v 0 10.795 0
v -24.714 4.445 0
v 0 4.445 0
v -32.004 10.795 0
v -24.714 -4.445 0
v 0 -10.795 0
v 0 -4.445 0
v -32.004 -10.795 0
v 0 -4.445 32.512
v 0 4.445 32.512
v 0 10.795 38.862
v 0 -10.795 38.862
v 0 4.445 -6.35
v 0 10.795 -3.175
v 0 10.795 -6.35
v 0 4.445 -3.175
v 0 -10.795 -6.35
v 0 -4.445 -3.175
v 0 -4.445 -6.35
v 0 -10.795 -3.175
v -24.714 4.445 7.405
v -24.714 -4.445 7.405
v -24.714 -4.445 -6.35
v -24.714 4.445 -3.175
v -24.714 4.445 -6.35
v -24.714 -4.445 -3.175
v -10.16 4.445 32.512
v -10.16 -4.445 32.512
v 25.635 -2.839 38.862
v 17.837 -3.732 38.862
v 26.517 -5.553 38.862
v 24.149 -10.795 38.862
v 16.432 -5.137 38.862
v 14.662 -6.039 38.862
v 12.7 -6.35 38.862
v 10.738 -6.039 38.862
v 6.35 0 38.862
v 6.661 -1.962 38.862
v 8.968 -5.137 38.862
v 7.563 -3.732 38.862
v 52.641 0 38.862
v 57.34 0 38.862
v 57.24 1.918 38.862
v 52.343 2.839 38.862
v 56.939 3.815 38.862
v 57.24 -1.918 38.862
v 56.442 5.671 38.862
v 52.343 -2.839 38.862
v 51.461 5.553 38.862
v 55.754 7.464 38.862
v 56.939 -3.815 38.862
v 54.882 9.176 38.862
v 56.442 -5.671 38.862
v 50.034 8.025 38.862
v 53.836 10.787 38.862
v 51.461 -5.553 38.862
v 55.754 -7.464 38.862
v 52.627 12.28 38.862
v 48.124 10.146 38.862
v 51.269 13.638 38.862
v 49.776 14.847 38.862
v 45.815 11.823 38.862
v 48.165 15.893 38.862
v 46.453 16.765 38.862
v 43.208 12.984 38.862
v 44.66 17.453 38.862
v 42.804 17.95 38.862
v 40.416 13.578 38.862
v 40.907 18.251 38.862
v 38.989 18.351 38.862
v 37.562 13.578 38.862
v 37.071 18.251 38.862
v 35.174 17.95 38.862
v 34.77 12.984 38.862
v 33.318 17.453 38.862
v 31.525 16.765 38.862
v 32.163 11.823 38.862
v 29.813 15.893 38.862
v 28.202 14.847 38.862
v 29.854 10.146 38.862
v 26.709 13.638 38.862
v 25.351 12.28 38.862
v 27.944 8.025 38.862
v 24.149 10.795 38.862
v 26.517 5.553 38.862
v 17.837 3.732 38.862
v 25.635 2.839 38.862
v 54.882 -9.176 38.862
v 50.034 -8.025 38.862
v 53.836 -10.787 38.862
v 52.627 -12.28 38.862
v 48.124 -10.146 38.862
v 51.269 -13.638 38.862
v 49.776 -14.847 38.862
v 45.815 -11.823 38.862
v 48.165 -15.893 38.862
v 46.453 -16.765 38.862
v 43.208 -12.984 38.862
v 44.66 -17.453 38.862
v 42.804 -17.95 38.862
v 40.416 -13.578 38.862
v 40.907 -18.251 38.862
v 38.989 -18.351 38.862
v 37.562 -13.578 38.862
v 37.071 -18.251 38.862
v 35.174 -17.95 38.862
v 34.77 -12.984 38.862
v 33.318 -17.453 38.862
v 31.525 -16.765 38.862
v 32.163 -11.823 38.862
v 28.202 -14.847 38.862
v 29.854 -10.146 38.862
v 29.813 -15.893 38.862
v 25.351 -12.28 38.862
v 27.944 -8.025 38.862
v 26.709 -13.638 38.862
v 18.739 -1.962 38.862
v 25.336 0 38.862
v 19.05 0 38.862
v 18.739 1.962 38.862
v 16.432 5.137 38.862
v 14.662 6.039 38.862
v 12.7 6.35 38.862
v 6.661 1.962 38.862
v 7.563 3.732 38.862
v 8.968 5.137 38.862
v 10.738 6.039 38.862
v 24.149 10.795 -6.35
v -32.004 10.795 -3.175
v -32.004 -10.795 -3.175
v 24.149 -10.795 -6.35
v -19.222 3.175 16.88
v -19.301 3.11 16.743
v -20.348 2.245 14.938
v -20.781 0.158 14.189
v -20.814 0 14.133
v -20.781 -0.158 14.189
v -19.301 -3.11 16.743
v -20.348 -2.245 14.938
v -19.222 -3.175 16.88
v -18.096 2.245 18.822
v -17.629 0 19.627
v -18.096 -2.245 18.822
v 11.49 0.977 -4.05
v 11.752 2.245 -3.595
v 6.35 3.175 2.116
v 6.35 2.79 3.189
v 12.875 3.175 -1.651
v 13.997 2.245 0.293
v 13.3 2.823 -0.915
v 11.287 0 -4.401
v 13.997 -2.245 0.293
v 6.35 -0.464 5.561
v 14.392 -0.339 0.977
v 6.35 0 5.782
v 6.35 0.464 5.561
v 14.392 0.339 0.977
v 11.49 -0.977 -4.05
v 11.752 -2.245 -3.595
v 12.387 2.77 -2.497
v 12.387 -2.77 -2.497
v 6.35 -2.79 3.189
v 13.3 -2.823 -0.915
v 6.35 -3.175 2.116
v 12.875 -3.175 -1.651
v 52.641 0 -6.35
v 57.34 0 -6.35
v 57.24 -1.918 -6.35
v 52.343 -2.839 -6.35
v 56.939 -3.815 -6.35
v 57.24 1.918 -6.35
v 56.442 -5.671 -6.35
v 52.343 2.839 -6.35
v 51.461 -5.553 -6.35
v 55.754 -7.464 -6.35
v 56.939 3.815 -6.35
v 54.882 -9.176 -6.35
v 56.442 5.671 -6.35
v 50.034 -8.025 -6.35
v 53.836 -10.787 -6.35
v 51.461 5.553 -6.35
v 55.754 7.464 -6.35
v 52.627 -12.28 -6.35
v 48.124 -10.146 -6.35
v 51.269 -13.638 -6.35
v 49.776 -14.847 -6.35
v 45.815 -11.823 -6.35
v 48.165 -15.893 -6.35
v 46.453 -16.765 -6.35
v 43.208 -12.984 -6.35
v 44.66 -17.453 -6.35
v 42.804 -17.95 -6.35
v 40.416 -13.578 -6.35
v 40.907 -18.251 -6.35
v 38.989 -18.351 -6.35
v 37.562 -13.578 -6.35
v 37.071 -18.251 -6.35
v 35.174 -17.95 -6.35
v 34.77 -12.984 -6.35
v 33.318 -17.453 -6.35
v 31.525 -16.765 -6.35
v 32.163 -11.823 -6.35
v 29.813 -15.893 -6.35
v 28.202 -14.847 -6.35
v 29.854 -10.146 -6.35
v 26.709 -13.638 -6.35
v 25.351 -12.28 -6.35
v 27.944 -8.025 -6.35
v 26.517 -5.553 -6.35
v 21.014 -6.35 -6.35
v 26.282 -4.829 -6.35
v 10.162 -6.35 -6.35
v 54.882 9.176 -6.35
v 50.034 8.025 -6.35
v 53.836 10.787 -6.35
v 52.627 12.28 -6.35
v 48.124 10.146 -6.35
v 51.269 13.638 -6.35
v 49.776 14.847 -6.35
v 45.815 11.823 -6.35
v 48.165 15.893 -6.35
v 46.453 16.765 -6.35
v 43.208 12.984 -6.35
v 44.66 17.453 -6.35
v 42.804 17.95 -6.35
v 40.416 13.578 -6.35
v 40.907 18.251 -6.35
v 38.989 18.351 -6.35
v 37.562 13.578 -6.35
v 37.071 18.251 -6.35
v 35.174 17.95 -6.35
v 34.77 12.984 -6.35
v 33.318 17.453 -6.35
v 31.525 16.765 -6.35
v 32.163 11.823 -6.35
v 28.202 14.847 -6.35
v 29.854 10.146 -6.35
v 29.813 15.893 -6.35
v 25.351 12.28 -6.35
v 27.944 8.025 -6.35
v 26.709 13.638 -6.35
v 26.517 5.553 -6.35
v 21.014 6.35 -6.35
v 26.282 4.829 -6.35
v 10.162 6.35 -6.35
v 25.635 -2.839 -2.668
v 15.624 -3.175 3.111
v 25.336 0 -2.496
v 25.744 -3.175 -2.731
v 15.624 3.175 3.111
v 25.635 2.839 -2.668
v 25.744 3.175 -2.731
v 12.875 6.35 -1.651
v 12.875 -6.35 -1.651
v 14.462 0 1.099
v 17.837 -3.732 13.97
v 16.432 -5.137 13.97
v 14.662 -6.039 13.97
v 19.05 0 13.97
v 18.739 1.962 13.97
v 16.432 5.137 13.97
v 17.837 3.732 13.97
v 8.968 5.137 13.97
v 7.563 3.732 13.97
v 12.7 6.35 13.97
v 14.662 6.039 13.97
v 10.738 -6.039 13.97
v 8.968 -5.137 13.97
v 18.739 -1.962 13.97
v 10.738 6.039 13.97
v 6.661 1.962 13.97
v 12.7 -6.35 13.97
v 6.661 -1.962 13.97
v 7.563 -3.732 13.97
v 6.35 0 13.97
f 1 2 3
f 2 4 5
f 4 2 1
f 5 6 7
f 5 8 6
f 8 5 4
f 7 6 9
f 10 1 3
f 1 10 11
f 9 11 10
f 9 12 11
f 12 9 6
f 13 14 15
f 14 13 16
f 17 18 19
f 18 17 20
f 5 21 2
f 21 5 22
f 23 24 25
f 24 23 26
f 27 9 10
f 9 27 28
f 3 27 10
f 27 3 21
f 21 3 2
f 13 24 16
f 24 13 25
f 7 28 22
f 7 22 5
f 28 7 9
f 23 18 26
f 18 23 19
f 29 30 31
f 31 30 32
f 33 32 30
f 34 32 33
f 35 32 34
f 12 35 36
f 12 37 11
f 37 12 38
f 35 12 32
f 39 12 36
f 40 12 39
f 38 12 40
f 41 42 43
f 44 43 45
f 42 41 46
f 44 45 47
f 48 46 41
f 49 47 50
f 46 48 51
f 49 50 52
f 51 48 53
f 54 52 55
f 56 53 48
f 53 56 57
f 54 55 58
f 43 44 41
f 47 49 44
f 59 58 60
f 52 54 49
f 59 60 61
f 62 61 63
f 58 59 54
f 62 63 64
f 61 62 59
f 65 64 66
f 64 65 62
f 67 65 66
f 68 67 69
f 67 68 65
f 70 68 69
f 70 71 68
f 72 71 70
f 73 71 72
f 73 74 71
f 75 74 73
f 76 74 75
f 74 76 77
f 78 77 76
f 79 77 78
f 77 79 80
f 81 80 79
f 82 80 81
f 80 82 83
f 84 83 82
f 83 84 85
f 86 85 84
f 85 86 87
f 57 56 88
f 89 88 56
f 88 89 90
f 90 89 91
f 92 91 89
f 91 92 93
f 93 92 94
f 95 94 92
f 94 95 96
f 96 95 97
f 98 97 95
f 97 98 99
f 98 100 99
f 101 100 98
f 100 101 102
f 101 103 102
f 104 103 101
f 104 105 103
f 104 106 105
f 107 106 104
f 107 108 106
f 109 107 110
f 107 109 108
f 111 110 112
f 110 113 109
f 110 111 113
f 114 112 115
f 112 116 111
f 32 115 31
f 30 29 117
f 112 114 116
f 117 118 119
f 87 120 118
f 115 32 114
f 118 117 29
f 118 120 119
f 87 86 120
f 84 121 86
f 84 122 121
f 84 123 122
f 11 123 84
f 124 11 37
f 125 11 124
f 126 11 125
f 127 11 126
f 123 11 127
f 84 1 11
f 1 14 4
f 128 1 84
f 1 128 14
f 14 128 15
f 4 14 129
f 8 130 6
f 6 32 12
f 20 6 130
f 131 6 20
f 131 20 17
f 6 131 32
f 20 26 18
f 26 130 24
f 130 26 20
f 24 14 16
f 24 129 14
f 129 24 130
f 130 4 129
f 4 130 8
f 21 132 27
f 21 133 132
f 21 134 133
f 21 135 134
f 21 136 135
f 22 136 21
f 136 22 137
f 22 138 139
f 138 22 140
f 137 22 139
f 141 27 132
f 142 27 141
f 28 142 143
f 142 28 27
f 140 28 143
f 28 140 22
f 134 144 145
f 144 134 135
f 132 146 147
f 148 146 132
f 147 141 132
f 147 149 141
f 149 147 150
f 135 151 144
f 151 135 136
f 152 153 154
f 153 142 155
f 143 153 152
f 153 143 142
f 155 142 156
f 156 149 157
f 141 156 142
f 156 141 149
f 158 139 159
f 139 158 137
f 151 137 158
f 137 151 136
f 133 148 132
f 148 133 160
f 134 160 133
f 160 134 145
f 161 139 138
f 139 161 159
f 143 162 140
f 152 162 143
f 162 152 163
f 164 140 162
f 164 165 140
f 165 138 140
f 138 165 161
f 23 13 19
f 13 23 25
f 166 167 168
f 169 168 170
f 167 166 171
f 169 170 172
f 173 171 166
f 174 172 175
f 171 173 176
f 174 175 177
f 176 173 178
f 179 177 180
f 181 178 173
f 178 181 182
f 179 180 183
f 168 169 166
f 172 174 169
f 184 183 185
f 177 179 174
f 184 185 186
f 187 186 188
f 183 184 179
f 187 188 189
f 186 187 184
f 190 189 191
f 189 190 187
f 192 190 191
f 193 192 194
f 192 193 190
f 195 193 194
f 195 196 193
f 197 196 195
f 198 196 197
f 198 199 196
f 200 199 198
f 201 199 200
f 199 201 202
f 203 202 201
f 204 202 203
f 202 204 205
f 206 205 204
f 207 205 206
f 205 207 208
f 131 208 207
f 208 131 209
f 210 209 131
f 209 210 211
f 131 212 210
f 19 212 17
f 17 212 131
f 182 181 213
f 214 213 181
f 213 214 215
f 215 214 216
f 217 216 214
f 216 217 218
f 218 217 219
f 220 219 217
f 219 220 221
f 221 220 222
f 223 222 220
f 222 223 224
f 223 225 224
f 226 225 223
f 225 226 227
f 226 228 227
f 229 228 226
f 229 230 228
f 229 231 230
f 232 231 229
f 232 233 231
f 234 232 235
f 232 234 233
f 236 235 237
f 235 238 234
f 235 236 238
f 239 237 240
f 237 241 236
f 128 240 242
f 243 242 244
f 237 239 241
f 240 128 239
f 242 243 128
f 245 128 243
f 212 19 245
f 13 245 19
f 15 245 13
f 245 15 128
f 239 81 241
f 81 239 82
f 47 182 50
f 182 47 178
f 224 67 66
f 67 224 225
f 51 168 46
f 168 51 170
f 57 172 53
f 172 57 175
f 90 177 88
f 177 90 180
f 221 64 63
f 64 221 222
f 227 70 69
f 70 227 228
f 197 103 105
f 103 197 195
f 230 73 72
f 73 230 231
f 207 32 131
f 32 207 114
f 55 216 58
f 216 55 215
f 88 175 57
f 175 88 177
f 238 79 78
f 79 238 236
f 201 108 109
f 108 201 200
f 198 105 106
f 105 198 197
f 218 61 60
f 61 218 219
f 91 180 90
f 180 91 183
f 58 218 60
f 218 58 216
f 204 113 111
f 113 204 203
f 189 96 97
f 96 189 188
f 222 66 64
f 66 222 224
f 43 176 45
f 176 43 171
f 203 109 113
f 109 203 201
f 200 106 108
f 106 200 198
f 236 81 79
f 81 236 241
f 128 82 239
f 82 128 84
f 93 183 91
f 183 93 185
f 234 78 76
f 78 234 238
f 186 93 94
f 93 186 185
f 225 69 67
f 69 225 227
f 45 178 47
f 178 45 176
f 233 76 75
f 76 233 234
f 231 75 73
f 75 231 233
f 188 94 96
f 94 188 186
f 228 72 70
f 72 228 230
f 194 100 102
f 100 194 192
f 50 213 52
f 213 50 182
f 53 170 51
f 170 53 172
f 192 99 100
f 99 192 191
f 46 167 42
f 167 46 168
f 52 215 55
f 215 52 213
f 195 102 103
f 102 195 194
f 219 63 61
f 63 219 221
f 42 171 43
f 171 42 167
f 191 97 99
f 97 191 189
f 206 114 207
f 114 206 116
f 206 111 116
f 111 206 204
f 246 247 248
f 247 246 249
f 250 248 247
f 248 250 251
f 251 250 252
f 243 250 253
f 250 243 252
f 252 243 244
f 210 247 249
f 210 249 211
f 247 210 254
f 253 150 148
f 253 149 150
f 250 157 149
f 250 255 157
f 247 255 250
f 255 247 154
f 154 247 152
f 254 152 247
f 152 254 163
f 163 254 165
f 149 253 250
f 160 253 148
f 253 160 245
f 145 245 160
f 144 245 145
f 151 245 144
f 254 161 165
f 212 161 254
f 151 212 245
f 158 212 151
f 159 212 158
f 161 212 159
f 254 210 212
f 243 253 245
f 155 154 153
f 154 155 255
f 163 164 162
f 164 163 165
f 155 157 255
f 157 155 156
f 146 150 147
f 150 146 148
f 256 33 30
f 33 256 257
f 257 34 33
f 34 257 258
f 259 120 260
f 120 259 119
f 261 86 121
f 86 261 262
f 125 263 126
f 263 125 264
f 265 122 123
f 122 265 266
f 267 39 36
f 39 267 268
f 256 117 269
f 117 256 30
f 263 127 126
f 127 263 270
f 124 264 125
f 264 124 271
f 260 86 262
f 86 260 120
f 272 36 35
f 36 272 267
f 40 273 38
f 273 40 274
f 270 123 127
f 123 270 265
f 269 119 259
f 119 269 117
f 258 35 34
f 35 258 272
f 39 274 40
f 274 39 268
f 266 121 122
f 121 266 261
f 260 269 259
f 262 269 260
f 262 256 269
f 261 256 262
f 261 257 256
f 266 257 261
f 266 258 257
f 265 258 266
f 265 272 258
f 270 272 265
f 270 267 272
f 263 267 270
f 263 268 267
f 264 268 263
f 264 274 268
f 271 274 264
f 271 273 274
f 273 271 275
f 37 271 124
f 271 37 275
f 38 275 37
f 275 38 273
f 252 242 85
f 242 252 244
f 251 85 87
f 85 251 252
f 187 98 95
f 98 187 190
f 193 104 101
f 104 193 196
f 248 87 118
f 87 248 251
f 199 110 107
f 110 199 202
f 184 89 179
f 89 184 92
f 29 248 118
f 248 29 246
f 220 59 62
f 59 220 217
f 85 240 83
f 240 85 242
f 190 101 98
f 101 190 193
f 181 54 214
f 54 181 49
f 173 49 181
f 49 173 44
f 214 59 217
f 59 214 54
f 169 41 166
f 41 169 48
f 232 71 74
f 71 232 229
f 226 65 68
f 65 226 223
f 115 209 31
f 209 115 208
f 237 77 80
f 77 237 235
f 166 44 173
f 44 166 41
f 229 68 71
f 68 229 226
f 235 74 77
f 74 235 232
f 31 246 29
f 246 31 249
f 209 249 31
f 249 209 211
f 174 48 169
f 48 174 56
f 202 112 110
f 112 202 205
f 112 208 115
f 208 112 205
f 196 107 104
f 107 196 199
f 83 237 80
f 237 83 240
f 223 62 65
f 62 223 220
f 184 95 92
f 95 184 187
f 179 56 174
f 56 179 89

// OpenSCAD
// file: ../Vitamins/Rod.scad
RodDiameter       = 1;
RodRadius         = 2;
RodClearanceSnug  = 3;
RodClearanceLoose = 4;
RodFn             = 5;

function RodClearanceSnug()  = RodClearanceSnug;
function RodClearanceLoose() = RodClearanceLoose;

RodOneEighthInch = [
  [RodDiameter, 1/8],
  [RodRadius, 1/8/2],
  [RodClearanceSnug, 0.02],
  [RodClearanceLoose, 0.03],
  [RodFn, 8]
];
function Spec_RodOneEighthInch() = RodOneEighthInch;

RodOneQuarterInch = [
  [RodDiameter,       1/4],
  [RodRadius,         1/4/2],
  [RodClearanceSnug,  0.027],
  [RodClearanceLoose, 0.035],
  [RodFn,             8]
];
function Spec_RodOneQuarterInch() = RodOneQuarterInch;

RodFiveSixteenthInch = [
  [RodDiameter,       5/16],
  [RodRadius,         5/16/2],
  [RodClearanceSnug,  0.025],
  [RodClearanceLoose, 0.025],
  [RodFn,             10]
];
function Spec_RodFiveSixteenthInch() = RodFiveSixteenthInch;

RodThreeQuarterInchTubing = [
  [RodDiameter,       0.758],
  [RodRadius,         0.758/2],
  [RodClearanceSnug,  0.023],
  [RodClearanceLoose, 0.029],
  [RodFn,             30]
];
function Spec_RodThreeQuarterInchTubing() = RodThreeQuarterInchTubing;

/**
 * Lookup the diameter of a rod.
 * @param rod The rod to lookup.
 * @param clearance The RodClearance to use.
 */
function RodDiameter(rod=undef, clearance=undef)
           = lookup(RodDiameter, rod)
          + (clearance != undef ? lookup(clearance, rod) : 0);

/**
 * Lookup the radius of a rod.
 * @param rod The rod to lookup.
 * @param clearance The RodClearance to use.
 */
function RodRadius(rod, clearance=undef) = RodDiameter(rod, clearance)/2;

/**
 * Lookup the $fn value for a rod, optionally overriding it
 * @param rod The rod to lookup.
 * @param $fn Override the RodFn. If defined, this will be the result. (convenience arg)
 **/
function RodFn(rod, $fn=undef) = ($fn == undef) ? lookup(RodFn, rod) : $fn;

/**
 * A 2D rod (circle).
 * @param rod The rod to render.
 * @param clearance The RodClearance to use.
 * @param $fn Override the RodFn value of the rod.
 */
module Rod2d(rod=RodOneQuarterInch, clearance=undef, $fn=undef) {
  circle(r=RodRadius(rod, clearance),
         $fn=RodFn(rod, $fn));
}


module Rod(rod=RodOneQuarterInch, length=1, clearance=undef, center=false, $fn=undef) {
  render(convexity=1)
  linear_extrude(height=length, center=center)
  Rod2d(rod, clearance, $fn=$fn);
}

// 1/8" Rod
1_8_rod_d                = 1/8;
1_8_rod_r                = 1_8_rod_d/2;
1_8_rod_clearance        = 0.02;
1_8_rod_clearance_loose  = 0.03;

// 1/4" Rod
1_4_rod_d                = 1/4;
1_4_rod_r                = 1_4_rod_d/2;
1_4_rod_clearance        = 0.01;
1_4_rod_clearance_loose  = 0.015;
1_4_rod_collar_d         = 1/22;
1_4_rod_collar_width     = 0.27;
1_4_rod_collar_clearance = 0.0; // TODO

// 5/16" Rod
5_16_rod_d                = 5/16;
5_16_rod_r                = 5_16_rod_d/2;
5_16_rod_clearance        = 0.02; // TODO
5_16_rod_clearance_loose  = 0.02;

module rod(diameter=1, length=1, clearance=0, clearance_loose=0, loose=false, cutter=false, center=false, $fn=20) {
  clearance = loose ? clearance_loose : clearance;

  if (cutter) {
    cylinder(r=(diameter/2) + (loose ? clearance_loose : clearance), h=length, center=center);
  } else {
    cylinder(r=diameter/2, h=length, center=center);
  }
}

module 1_8_rod(length=1, loose=false, cutter=false, center=false) {
  rod(diameter=1_8_rod_d,
      clearance=1_8_rod_clearance,
      clearance_loose=1_8_rod_clearance_loose,
      length=length,
      cutter=cutter,
      center=center);
}

module 1_4_rod(length=1, loose=false, cutter=false, center=false) {
  rod(diameter=1_4_rod_d,
      clearance=1_4_rod_clearance,
      clearance_loose=1_4_rod_clearance_loose,
      loose=loose,
      length=length,
      cutter=cutter,
      center=center);
}

module 1_4_rod_collar(cutter=false) {
  rod(diameter=1_4_rod_collar_d,
      clearance=1_4_rod_collar_clearance,
      cutter=cutter,
      length=1_4_rod_collar_width);
}

module 5_16_rod(length=1, loose=false, cutter=false, center=false) {
  rod(diameter=5_16_rod_d,
      clearance=5_16_rod_clearance,
      clearance_loose=5_16_rod_clearance_loose,
      length=length,
      cutter=cutter,
      center=center);
}
// file: ../Vitamins/Angle Stock.scad
AngleStockWidth                   = 1;
AngleStockThickness               = 2;
AngleStockTrough                  = 3; // Thickness across the "elbow" of the angle
AngleStockWidthClearanceSnug      = 4;
AngleStockWidthClearanceLoose     = 5;
AngleStockThicknessClearanceSnug  = 6;
AngleStockThicknessClearanceLoose = 7;
AngleStockHeight                  = 8;

// .747
// .744
// .745
//.740


//.749
//.75
AngleStockThreeQuartersByOneEighthInch = [
  [AngleStockWidth,                   0.771],
  [AngleStockThickness,               0.13],
  [AngleStockTrough,                  0.235],
  [AngleStockWidthClearanceSnug,      0.008],
  [AngleStockWidthClearanceLoose,     0.015],
  [AngleStockThicknessClearanceSnug,  0.007],
  [AngleStockThicknessClearanceLoose, 0.008],
  [AngleStockHeight,                  0.574]
];

3_4_angle_stock_width                     = 3/4;
3_4_angle_stock_thickness                 = 0.13;
3_4_angle_stock_trough                    = 0.235;
3_4_angle_stock_height                    = 0.574;
3_4_angle_stock_width_clearance           = 0.008;
3_4_angle_stock_width_clearance_loose     = 0.008;
3_4_angle_stock_thickness_clearance       = 0.005;
3_4_angle_stock_thickness_clearance_loose = 0.007;

// trough is a percentage: 0.0-1.0
module AngleStock(stock=AngleStockThreeQuartersByOneEighthInch, trough=.5, thicknessClearance=AngleStockThicknessClearanceLoose, widthClearance=AngleStockWidthClearanceLoose, length=1) {

  // A percentage of the inner-side length (width - thickness)
  clearThicknessOffset = thicknessClearance != undef ? lookup(thicknessClearance, stock) : 0;
  clearWidthOffset     = widthClearance     != undef ? lookup(widthClearance, stock)     : 0;
  troughOffset         = (trough * (lookup(AngleStockWidth, stock) - lookup(AngleStockThickness, stock))) + lookup(AngleStockThickness, stock);

  linear_extrude(height=length)
  polygon(points=[[0,0],
                  [lookup(AngleStockWidth, stock)+clearWidthOffset,0],                                                         // X-POS Outer Corner
                  [lookup(AngleStockWidth, stock)+clearWidthOffset,lookup(AngleStockThickness, stock)+clearThicknessOffset],   // X-POS Inner Corner
                  [troughOffset,lookup(AngleStockThickness, stock)+clearThicknessOffset],                                      // X-POS Trough
                  [lookup(AngleStockThickness, stock)+clearThicknessOffset,troughOffset],                                      // Y-POS Trough
                  [lookup(AngleStockThickness, stock)+clearThicknessOffset,lookup(AngleStockWidth, stock)+clearWidthOffset],   // Y-POS Inner Corner
                  [0,lookup(AngleStockWidth, stock)+clearWidthOffset],                                                         // Y-POS Outer Corner
          ],
          paths=[[0,1,2,3,4,5,6]]);
}


//#AngleStock();

module 3_4_angle_stock(length=1, cutter=false, loose=false) {
  width_clearance     = loose ? 3_4_angle_stock_width_clearance_loose     : 3_4_angle_stock_width_clearance;
  thickness_clearance = loose ? 3_4_angle_stock_thickness_clearance_loose : 3_4_angle_stock_thickness_clearance;

  union() {
    if (cutter) {
      translate([-width_clearance,-thickness_clearance,0])
      cube([3_4_angle_stock_width     + width_clearance*2,
            3_4_angle_stock_thickness + thickness_clearance*2,
            length]);

      translate([-width_clearance,-thickness_clearance,0])
      cube([3_4_angle_stock_thickness + thickness_clearance*2,
            3_4_angle_stock_width     + width_clearance*2,
            length]);

      translate([3_4_angle_stock_thickness/2, 3_4_angle_stock_thickness/2, 0])
      difference() {
        cube([3_4_angle_stock_trough + thickness_clearance/2,
              3_4_angle_stock_trough + thickness_clearance/2,
              length]);

        translate([3_4_angle_stock_trough + thickness_clearance/2,
                   thickness_clearance/2,
                   -0.1])
        rotate([0,0,45])
        cube([3_4_angle_stock_trough*sqrt(2),
              3_4_angle_stock_trough*sqrt(2),
              length + 0.2]);
      }

    } else {
      cube([3_4_angle_stock_width,3_4_angle_stock_thickness,length]);
      cube([3_4_angle_stock_thickness,3_4_angle_stock_width,length]);

      translate([3_4_angle_stock_thickness, 3_4_angle_stock_thickness, 0])
      difference() {
        cube([3_4_angle_stock_trough, 3_4_angle_stock_trough,length]);

        translate([3_4_angle_stock_trough,0,-0.1])
        rotate([0,0,45])
        cube([3_4_angle_stock_trough*sqrt(2), 3_4_angle_stock_trough*sqrt(2),length + 0.2]);
      }
    }
  };
}
// file: ../Math/Triangles.scad
// Pythagorean Theorem
function pyth_A_B(a,b) = sqrt(pow(a, 2) + pow(b, 2));
function pyth_A_C(a,c) = sqrt(pow(c, 2) - pow(a, 2));
function pyth_B_C(b,c) = sqrt(pow(c, 2) - pow(b, 2));

// Heron's Formula for Triangle Area
function heron_triangle_area(a,b,c) = sqrt(
    ((a+b+c)/2)
    * (((a+b+c)/2) - a)
    * (((a+b+c)/2) - b)
    * (((a+b+c)/2) - c)
  );

function heron_triangle_height(a,b,c) = 2 * heron_triangle_area(a,b,c) / c;
// file: ../Components.scad
include <Math/Triangles.scad>;
include <Vitamins/Angle Stock.scad>;
include <Vitamins/Pipe.scad>;
include <Vitamins/Rod.scad>;

//
// Component Dimensions
//
$fn=60;

// Fascist Settings
overall_length = 26.5;
barrel_length = 18.5;

// Configurable: Wall Thickness
tee_overlap             = 3/16;

rope_od                 = 6/32;

// Configurable: Cylinder
cylinder_spindle_diameter    = 1/8;
cylinder_spindle_wall        = 5/16;
revolver_cylinder_wall       = PipeWall(PipeOneInch);
revolver_cylinder_outer_wall = 3/64;
spindle_overlap              = revolver_cylinder_wall;
revolver_zigzag_pin_diameter = 4/32;
revolver_zigzag_depth        = 3/16;
revolver_shots               = 6;
zigzag_clearance             = 1/64;
chamber_length               = 3;
chamber_seal_overlap         = 1/4;
spindle_collar_diameter      = 0.505;
spindle_collar_height        = 0.27;
actuator_cylinder_clearance  = 0.1;

// Configurable: Vitamin Selection
railRod        = RodFiveSixteenthInch;
breechBushing  = BushingThreeQuarterInch;
barrelPipe     = TubingOnePointOneTwoFive;
stockPipe      = PipeThreeQuarterInch;
receiverTee    = TeeThreeQuarterInch;
gasSealingPipe = PipeOneInch;

// Configurable: Common Settings
bottomRailAngle = 50;

// Configurable: Forend
forend_length = 2;
forend_wall_thickness = 3/16;

// AR15 grip info
grip_width                 = 0.85;
grip_height                = 1.27;


// Calculated: Revolver Cylinder
zigzag_width = revolver_zigzag_pin_diameter + zigzag_clearance*2;
revolver_cylinder_radius = (PipeOuterDiameter(PipeThreeQuarterInch)*1.5)+revolver_cylinder_wall + revolver_cylinder_outer_wall + revolver_zigzag_depth;
revolver_cylinder_od   = revolver_cylinder_radius*2;
cylinder_circumference = 3.14 * pow(revolver_cylinder_od/2, 2);
revolver_center_offset = PipeOuterDiameter(PipeThreeQuarterInch) + revolver_cylinder_wall;
rotation_angle = 360/revolver_shots;
rotation_arc = cylinder_circumference/revolver_shots;
zigzag_height = rotation_arc/2 + revolver_zigzag_pin_diameter*2;
revolver_cylinder_height = zigzag_height + revolver_zigzag_pin_diameter*2.5;
chamber_protrusion = (chamber_length - revolver_cylinder_height)/2;

top_slot_height = revolver_zigzag_pin_diameter*2;
bottom_slot_height = revolver_zigzag_pin_diameter*2 + zigzag_clearance*1.5;
// file: ../AR15 Grip Mount.scad
include <Components.scad>;

ar15_grip_POSITION_FRONT   = 0; // Default
ar15_grip_POSITION_REAR    = 1;
  slot_width = .35;
  slot_height = .973;
  slot_length = 1.28;
  slot_angle  = 30.1;
  slot_angle_offset = -0.4;
  slot_overlap = 1/4;

  grip_width = 0.85;
  grip_height = 1.26;
  grip_bolt_diameter = 1/4;

    // TODO: Calculate this instead of specifying
    grip_bolt_length = 2;
    grip_bolt_offset_x = -slot_length/2 - grip_bolt_diameter/2 - 0.04; // Why?


module ar15_grip_bolt(od=grip_bolt_diameter, length=4,
                      nut_od=0.5, nut_height=0.25,
                      nut_offset=2, nut_angle=0,
                      nut_slot_length=0, nut_slot_angle=0) {
    translate([grip_bolt_offset_x,0,-length/4])
    rotate([0,30,0])
    union() {
      cylinder(r=od/2, h=length, $fn=8);

      // Nut
      if (nut_offset)
      translate([0,0,nut_offset]) {
      rotate([0,0,nut_angle])
        cylinder(r=nut_od/2, h=nut_height, $fn=6);

        if (nut_slot_length > 0)
        rotate([0,0,nut_slot_angle])
        translate([-nut_od/2,0,0])
        cube([nut_od, nut_slot_length, nut_height]);
      }
    }
}

module ar15_grip(mount_height=1, mount_length=1, position=0, top_extension = 0, extension=0,
                 nut_od=0.5, nut_height=0.25, nut_offset=2, nut_angle=0,
                 debug=false) {

  // Positioning options
  x_offset = position == ar15_grip_POSITION_REAR ? slot_length : 0;

  translate([x_offset, 0,0])
  difference() {

    union() {

      // Mount body
      translate([-slot_length,-slot_width/2,-slot_height])
      color("Fuchsia")
      cube([slot_length + extension,slot_width,slot_height]);

      // Vertical Mounting Block
      if (mount_height > 0)
      intersection() {
        translate([-slot_length - slot_overlap,-grip_width/2,0])
        color("Purple")
        cube([slot_length + slot_overlap + top_extension,grip_width,mount_height]);

        *union() {
          translate([-slot_length - slot_overlap + grip_width/2,0,-0.1])
          cylinder(r=grip_width/2, h=mount_height + 0.2);

          translate([-slot_length - slot_overlap + grip_width/2,-grip_width/2,0])
          color("Purple")
          cube([slot_length+top_extension,grip_width,mount_height]);
        }
      }

      // Horizontal Mounting Block
      if (mount_length > 0)
      translate([0,-grip_width/2,-grip_height])
      color("Indigo")
      cube([mount_length,grip_width,grip_height + mount_height]);


      // Grip
      if(debug)
      translate([-1.766,0])
      rotate([180,0,-90])
      scale([1/25.4, 1/25.4, 1/25.4])
      import("Vitamins/Grip.stl");
    }

    // Angle cutter
    translate([-slot_length,0,slot_angle_offset])
    rotate([0,slot_angle,0])
    translate([0,-slot_width/2 - 0.1,-1])
    cube([1.2, slot_width + 0.2, 1]);

    // Mounting Hole Cutter
    ar15_grip_bolt(nut_offset=nut_offset, nut_height=0, nut_angle=nut_angle);

  }

}


// Test Print
scale([25.4,25.4,25.4]) {
  //translate([0,0,1/4])
  rotate([0,90,0])
  ar15_grip(mount_height = 1/4, mount_length = 1/8);
}
// main file
include <../AR15 Grip Mount.scad>;

ar15_grip_POSITION_FRONT   = 0; // Default
ar15_grip_POSITION_REAR    = 1;
  slot_width = .35;
  slot_height = .973;
  slot_length = 1.28;
  slot_angle  = 30.1;
  slot_angle_offset = -0.4;
  slot_overlap = 1/4;

  grip_width = 0.85;
  grip_height = 1.26;
  grip_bolt_diameter = 1/4;

    // TODO: Calculate this instead of specifying
    grip_bolt_length = 2;
    grip_bolt_offset_x = -slot_length/2 - grip_bolt_diameter/2 - 0.04; // Why?


module ar15_grip_bolt(od=grip_bolt_diameter, length=4,
                      nut_od=0.5, nut_height=0.25,
                      nut_offset=2, nut_angle=0,
                      nut_slot_length=0, nut_slot_angle=0) {
    translate([grip_bolt_offset_x,0,-length/4])
    rotate([0,30,0])
    union() {
      cylinder(r=od/2, h=length, $fn=8);

      // Nut
      if (nut_offset)
      translate([0,0,nut_offset]) {
      rotate([0,0,nut_angle])
        cylinder(r=nut_od/2, h=nut_height, $fn=6);

        if (nut_slot_length > 0)
        rotate([0,0,nut_slot_angle])
        translate([-nut_od/2,0,0])
        cube([nut_od, nut_slot_length, nut_height]);
      }
    }
}

module ar15_grip(mount_height=1, mount_length=1, position=0, top_extension = 0, extension=0,
                 nut_od=0.5, nut_height=0.25, nut_offset=2, nut_angle=0,
                 debug=false) {

  // Positioning options
  x_offset = position == ar15_grip_POSITION_REAR ? slot_length : 0;

  translate([x_offset, 0,0])
  difference() {

    union() {

      // Mount body
      translate([-slot_length,-slot_width/2,-slot_height])
      color("Fuchsia")
      cube([slot_length + extension,slot_width,slot_height]);

      // Vertical Mounting Block
      if (mount_height > 0)
      intersection() {
        translate([-slot_length - slot_overlap,-grip_width/2,0])
        color("Purple")
        cube([slot_length + slot_overlap + top_extension,grip_width,mount_height]);

        *union() {
          translate([-slot_length - slot_overlap + grip_width/2,0,-0.1])
          cylinder(r=grip_width/2, h=mount_height + 0.2);

          translate([-slot_length - slot_overlap + grip_width/2,-grip_width/2,0])
          color("Purple")
          cube([slot_length+top_extension,grip_width,mount_height]);
        }
      }

      // Horizontal Mounting Block
      if (mount_length > 0)
      translate([0,-grip_width/2,-grip_height])
      color("Indigo")
      cube([mount_length,grip_width,grip_height + mount_height]);


      // Grip
      if(debug)
      translate([-1.766,0])
      rotate([180,0,-90])
      scale([1/25.4, 1/25.4, 1/25.4])
      import("Vitamins/Grip.stl");
    }

    // Angle cutter
    translate([-slot_length,0,slot_angle_offset])
    rotate([0,slot_angle,0])
    translate([0,-slot_width/2 - 0.1,-1])
    cube([1.2, slot_width + 0.2, 1]);

    // Mounting Hole Cutter
    ar15_grip_bolt(nut_offset=nut_offset, nut_height=0, nut_angle=nut_angle);

  }

}


// Test Print
scale([25.4,25.4,25.4]) {
  intersection() {
    rotate([0,90,0])
    difference() {
      union() {
        ar15_grip(mount_height = 1.1, mount_length = 0, top_extension=1/4, extension=1/4);

        translate([-slot_length-1/4,0,1 + PipeOuterRadius(PipeThreeQuarterInch)])
        rotate([0,90,0])
        cylinder(r=PipeOuterRadius(PipeThreeQuarterInch) + tee_overlap, h=slot_length + 1/2);
      }

      translate([-.55,0,.5])
      rotate([0,-90,0])
      #cylinder(r=.25, h=slot_length+1, $fn=20);

      translate([-slot_length-1/4,0,1 + PipeOuterRadius(PipeThreeQuarterInch)])
      rotate([0,90,0]) {
        translate([0,0,-0.1])
        Pipe(pipe=PipeThreeQuarterInch, clearance=PipeClearanceSnug, length=slot_length+1/2+0.2);

        translate([0,0,slot_length])
        *#cylinder(r=PipeOuterRadius(PipeThreeQuarterInch,PipeClearanceSnug) + tee_overlap + 0.05, h=1);
      }

      // Mounting Hole Cutter (From Tee Housing Rear)
      #ar15_grip_bolt(nut_offset=1.74, nut_height=1, nut_slot_length=1, nut_slot_angle=-90, nut_angle=90);
    }

    *#translate([-4,-3,-1.3])
    cube([6,6,1.68]);
  }
}
